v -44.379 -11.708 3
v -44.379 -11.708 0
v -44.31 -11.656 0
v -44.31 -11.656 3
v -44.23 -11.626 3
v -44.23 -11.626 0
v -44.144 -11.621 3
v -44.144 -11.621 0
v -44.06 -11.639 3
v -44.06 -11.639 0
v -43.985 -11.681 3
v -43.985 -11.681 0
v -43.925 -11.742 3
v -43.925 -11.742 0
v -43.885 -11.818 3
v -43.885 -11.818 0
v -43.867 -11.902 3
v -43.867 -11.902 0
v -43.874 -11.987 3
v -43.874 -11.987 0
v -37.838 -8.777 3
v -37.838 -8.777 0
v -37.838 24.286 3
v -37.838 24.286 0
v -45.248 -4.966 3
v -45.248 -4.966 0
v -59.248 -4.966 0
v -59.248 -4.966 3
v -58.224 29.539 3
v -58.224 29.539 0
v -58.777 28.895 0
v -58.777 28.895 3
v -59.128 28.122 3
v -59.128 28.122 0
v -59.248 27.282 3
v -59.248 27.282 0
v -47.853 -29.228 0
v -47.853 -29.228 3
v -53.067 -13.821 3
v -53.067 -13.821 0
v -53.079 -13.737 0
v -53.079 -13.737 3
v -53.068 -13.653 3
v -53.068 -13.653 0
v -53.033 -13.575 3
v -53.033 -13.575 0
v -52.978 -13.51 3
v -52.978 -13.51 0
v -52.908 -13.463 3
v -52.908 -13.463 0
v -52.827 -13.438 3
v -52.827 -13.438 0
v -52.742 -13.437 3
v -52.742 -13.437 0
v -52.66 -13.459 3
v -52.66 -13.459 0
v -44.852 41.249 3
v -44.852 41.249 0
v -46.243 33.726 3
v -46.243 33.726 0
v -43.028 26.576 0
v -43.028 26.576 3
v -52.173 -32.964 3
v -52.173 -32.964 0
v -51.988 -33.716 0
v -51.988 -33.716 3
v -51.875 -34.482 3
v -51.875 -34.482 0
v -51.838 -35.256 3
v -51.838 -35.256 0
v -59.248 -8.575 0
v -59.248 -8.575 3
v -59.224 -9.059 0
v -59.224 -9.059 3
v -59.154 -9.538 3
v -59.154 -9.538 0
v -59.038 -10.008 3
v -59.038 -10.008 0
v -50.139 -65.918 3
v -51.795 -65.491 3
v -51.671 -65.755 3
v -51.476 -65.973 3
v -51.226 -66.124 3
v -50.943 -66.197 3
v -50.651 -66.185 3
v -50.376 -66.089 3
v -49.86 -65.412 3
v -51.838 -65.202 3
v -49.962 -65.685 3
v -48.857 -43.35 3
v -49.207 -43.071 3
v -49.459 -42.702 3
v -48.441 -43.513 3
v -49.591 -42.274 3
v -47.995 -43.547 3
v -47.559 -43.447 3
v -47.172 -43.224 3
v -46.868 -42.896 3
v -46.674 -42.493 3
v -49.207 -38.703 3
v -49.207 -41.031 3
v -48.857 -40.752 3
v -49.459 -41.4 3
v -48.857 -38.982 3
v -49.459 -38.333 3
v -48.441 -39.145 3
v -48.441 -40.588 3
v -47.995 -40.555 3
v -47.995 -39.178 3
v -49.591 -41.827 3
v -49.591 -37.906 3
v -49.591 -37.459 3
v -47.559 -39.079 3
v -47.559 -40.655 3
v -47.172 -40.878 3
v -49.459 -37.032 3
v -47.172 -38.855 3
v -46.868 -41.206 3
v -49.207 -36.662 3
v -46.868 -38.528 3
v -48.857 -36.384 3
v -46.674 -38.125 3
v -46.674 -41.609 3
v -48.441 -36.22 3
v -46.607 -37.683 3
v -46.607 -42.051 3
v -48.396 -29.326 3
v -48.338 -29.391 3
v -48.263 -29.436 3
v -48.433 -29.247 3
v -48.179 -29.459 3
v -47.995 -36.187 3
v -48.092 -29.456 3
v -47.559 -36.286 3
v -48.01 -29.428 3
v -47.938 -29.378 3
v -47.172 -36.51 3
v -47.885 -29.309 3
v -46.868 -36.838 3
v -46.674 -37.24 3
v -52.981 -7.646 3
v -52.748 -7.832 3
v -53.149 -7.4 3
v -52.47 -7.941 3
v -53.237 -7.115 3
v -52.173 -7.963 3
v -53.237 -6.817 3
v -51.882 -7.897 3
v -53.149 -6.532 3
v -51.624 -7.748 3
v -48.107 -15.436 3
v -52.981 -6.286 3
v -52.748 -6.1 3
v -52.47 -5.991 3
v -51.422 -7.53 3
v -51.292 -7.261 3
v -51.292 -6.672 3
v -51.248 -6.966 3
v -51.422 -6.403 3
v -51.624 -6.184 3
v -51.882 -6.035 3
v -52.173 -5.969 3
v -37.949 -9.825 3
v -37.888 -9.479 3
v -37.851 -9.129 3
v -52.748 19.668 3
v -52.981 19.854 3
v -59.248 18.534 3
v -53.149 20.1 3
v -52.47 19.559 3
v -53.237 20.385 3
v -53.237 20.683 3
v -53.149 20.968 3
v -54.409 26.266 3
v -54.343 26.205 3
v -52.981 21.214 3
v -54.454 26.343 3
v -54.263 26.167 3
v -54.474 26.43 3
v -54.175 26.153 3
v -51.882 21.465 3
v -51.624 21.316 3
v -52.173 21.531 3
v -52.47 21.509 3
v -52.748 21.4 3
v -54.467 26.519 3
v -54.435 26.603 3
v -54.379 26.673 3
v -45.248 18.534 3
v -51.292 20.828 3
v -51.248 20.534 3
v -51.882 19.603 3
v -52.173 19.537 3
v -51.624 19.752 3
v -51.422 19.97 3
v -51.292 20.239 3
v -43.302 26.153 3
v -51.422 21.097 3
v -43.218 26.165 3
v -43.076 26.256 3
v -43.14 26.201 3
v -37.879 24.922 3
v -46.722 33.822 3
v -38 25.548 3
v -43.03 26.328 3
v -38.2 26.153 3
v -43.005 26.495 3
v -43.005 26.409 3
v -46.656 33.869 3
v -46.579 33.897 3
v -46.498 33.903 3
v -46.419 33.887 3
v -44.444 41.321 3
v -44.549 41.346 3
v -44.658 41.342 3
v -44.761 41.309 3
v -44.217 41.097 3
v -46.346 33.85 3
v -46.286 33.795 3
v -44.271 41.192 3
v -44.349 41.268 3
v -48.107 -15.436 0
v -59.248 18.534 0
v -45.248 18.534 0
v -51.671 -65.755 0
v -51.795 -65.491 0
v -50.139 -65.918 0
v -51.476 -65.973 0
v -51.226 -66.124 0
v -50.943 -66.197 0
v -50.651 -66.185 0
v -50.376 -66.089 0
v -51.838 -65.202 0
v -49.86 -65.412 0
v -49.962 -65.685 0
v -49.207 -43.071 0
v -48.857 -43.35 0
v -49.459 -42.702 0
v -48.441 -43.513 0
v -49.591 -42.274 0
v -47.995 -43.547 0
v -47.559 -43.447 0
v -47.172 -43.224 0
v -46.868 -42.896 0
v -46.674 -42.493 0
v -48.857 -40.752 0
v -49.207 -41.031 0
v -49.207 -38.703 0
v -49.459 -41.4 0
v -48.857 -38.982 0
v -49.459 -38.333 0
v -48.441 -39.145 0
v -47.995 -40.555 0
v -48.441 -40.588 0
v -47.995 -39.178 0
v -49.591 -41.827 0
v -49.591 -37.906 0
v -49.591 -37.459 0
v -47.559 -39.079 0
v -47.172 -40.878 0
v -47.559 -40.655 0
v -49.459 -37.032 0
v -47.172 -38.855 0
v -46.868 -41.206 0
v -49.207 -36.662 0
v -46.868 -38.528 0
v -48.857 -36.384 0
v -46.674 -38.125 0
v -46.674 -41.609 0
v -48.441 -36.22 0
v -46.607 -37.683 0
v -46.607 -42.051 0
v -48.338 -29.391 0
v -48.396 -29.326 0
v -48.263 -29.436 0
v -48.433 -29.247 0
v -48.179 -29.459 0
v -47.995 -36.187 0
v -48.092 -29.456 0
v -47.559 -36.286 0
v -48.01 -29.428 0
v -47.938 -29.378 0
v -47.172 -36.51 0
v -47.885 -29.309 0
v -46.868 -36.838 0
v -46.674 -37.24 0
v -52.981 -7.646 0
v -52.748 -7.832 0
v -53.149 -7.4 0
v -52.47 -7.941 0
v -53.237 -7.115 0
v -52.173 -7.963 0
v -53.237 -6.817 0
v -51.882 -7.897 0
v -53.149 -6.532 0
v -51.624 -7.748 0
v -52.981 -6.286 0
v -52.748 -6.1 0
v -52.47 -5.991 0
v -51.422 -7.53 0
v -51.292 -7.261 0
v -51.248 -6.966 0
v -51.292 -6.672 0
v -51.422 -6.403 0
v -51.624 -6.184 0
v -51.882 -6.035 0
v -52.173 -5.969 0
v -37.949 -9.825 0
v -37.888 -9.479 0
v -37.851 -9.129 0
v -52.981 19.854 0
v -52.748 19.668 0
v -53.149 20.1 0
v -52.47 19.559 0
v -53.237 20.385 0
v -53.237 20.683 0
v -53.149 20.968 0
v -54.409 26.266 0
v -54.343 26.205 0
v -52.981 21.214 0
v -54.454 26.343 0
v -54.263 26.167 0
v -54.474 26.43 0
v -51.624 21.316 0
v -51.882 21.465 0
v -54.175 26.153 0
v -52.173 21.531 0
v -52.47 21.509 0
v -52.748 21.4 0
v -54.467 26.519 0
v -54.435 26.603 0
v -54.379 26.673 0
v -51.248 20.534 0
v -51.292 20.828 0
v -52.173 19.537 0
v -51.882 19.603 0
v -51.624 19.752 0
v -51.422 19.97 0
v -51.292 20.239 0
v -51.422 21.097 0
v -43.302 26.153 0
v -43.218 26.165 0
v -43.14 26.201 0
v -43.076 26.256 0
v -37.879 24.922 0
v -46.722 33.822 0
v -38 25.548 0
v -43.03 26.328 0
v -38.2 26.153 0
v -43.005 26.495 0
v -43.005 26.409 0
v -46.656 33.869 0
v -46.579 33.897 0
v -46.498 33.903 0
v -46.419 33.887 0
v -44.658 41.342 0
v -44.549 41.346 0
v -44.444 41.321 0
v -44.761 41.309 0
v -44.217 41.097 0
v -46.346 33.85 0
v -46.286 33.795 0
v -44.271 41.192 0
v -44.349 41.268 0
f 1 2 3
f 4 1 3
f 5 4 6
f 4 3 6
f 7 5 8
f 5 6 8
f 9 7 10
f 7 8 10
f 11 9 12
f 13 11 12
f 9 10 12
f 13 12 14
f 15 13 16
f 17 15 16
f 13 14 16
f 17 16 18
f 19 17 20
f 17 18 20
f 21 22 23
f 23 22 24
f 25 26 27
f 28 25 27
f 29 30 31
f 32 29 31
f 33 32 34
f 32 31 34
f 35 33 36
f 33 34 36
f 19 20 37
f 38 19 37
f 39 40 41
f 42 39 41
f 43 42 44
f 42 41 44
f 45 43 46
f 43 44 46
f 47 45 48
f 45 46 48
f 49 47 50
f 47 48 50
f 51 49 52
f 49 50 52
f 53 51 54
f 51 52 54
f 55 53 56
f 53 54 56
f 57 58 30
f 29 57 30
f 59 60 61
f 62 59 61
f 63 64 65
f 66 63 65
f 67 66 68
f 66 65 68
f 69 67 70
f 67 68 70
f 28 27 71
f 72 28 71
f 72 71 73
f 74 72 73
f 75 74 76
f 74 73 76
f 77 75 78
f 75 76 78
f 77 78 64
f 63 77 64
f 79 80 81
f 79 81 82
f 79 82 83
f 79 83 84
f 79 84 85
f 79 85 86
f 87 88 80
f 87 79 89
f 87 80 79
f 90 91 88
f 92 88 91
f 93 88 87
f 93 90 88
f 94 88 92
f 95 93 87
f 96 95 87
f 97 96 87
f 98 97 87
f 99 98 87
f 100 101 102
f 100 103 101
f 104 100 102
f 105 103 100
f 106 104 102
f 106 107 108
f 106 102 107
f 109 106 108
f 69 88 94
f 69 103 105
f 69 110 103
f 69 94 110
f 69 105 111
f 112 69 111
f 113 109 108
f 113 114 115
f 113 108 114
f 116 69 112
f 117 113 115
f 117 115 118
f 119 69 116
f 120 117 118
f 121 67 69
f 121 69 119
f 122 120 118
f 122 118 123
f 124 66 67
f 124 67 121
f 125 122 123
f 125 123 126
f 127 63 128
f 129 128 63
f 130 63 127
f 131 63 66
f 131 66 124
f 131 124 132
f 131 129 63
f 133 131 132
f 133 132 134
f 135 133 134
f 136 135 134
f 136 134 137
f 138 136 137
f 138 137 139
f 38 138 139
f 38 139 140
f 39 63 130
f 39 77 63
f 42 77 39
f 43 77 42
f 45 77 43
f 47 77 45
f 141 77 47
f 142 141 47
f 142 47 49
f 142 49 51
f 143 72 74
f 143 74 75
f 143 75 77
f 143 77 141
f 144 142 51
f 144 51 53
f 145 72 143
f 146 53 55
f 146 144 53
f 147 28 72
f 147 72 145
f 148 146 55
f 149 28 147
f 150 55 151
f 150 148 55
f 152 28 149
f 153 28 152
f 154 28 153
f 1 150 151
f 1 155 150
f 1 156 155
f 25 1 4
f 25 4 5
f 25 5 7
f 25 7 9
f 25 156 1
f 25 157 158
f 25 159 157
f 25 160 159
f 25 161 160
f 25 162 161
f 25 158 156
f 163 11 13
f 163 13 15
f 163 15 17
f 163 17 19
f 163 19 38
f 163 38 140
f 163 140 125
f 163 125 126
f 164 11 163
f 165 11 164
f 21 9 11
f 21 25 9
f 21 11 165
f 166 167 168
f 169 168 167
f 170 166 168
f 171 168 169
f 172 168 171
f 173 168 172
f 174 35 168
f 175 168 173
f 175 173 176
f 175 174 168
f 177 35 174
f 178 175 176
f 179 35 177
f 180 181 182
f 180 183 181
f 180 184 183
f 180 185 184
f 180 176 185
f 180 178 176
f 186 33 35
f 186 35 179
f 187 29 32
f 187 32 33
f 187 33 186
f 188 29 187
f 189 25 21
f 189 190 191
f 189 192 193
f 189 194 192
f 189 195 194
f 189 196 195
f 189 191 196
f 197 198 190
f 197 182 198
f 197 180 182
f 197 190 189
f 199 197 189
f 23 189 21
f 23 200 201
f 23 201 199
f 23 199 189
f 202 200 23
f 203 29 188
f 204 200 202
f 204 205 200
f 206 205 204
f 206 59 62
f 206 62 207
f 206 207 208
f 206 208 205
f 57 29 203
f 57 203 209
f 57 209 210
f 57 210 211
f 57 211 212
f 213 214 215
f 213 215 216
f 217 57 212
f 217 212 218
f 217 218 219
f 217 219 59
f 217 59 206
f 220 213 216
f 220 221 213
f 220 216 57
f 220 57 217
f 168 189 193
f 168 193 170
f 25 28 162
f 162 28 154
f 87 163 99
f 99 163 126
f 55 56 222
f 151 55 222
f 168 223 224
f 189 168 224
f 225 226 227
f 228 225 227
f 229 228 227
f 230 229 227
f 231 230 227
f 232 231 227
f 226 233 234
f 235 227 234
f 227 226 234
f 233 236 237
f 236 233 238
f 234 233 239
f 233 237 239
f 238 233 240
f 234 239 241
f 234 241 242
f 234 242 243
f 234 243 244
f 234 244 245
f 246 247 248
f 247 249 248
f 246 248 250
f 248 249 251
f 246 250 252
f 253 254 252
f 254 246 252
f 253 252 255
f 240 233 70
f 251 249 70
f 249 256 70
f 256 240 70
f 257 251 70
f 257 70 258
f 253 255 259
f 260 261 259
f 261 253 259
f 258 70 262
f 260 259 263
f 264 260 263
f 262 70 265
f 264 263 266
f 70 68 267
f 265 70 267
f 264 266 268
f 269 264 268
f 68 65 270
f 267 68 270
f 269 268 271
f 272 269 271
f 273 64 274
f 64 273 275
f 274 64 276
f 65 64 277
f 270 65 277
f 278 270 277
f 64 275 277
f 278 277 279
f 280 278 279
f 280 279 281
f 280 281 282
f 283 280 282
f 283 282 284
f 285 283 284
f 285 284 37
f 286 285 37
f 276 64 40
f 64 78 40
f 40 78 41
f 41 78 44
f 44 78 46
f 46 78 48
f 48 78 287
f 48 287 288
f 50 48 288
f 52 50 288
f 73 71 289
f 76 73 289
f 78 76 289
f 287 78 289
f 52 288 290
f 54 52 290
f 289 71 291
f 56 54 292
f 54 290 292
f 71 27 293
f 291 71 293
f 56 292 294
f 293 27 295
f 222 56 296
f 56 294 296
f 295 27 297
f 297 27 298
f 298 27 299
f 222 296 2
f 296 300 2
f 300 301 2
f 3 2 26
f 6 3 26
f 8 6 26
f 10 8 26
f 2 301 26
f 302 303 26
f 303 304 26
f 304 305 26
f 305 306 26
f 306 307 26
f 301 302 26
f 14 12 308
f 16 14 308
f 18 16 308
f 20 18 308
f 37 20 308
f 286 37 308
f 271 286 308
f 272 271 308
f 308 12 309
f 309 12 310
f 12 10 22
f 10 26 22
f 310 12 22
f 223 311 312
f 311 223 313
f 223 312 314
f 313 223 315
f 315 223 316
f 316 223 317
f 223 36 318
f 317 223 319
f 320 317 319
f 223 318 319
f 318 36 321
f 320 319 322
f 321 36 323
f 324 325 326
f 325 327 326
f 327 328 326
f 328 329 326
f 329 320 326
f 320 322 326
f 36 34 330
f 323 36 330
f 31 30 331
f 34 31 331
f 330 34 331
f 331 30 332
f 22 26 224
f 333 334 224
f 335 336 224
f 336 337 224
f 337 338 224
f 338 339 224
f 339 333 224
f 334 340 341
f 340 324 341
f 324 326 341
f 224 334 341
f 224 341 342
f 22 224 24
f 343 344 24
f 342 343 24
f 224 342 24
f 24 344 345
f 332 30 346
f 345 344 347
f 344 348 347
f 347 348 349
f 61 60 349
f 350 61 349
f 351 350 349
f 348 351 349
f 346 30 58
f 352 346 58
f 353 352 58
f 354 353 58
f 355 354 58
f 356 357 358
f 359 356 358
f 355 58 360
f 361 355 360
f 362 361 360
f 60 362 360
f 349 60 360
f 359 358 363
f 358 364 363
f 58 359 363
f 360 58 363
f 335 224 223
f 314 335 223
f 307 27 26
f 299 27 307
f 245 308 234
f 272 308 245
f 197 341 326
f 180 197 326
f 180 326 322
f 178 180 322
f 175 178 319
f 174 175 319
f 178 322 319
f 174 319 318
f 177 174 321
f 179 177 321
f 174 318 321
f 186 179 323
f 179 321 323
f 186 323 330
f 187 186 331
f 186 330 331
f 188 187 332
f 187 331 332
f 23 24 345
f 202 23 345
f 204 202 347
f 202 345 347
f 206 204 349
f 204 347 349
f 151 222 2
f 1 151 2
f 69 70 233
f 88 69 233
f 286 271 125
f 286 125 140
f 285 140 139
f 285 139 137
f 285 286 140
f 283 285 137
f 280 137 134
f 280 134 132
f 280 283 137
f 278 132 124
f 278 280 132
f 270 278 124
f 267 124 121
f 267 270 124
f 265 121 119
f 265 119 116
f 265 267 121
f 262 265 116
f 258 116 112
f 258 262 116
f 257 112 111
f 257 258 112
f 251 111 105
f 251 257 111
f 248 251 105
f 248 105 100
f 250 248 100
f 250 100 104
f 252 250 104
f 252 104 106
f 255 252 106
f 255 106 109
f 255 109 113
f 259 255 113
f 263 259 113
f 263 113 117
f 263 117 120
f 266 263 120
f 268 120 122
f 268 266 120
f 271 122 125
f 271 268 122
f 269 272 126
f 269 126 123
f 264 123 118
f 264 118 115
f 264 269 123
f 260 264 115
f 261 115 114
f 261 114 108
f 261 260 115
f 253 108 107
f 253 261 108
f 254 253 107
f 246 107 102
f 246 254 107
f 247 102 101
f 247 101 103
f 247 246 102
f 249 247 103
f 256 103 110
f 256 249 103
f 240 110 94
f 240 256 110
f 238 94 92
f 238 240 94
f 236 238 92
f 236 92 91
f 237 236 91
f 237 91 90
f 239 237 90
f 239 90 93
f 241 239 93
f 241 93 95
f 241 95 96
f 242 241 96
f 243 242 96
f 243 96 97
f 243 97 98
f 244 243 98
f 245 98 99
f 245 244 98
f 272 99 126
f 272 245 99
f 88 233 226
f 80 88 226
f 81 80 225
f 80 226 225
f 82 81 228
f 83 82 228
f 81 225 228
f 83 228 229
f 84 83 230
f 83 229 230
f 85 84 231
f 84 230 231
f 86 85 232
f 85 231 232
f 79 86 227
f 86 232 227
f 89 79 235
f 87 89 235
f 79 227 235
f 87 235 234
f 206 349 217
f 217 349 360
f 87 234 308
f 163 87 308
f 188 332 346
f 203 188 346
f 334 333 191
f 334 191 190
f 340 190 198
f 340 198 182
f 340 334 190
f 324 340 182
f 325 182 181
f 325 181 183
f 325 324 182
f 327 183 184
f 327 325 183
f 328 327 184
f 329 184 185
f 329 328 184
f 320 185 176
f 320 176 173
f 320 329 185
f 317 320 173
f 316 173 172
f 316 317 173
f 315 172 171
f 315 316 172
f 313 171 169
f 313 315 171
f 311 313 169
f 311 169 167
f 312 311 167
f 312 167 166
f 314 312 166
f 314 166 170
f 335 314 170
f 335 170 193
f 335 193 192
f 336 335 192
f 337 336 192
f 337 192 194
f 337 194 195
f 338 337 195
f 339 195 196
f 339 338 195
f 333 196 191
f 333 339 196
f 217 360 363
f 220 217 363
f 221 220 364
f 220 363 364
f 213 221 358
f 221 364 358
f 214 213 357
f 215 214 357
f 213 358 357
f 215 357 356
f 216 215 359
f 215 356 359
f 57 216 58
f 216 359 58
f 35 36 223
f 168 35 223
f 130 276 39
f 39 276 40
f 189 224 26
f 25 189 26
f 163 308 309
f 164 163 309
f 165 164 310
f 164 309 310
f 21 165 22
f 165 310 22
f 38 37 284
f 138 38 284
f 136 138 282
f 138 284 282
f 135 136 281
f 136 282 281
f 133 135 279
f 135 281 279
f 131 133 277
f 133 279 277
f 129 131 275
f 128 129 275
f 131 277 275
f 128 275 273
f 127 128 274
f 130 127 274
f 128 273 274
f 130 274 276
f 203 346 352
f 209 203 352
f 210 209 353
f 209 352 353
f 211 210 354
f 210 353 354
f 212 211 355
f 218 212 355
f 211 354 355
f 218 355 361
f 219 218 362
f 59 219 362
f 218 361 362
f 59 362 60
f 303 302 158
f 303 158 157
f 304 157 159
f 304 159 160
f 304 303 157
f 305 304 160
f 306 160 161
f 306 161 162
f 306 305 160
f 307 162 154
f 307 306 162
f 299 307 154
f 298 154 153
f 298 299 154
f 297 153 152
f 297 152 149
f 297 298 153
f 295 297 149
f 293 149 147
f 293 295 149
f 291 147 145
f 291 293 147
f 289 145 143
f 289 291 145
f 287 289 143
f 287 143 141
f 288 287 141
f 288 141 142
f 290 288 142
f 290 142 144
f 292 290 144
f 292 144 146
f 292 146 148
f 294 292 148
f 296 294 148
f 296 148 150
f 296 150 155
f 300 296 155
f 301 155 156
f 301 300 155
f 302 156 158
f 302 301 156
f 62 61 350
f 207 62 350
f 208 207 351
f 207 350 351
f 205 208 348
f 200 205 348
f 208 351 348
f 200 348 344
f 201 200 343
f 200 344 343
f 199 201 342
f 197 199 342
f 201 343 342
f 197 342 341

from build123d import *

# Parameters (mm, degrees)
SKETCH1_R           = 1
SKETCH1_R_2         = 1.5
BOSS_EXTRUDE1_DEPTH = 3


with BuildPart() as part:
    # Sketch1 → Boss-Extrude1 (new body)
    with BuildSketch(Plane.XY):
        with BuildLine():
            Line((-59.247809755, 25.254592271), (-59.247809755, 18.533720681))
            Line((-59.247809755, 18.533720681), (-45.247809755, 18.533720681))
            Line((-45.247809755, 18.533720681), (-45.247809755, -4.966279319))
            Line((-45.247809755, -4.966279319), (-59.247809755, -4.966279319))
            Line((-59.247809755, -4.966279319), (-59.247809755, -8.575462785))
            ThreePointArc((-59.247809755, -8.575462785), (-59.195128163, -9.299369248), (-59.038193528, -10.008021094))
            Line((-59.038193528, -10.008021094), (-52.173270473, -32.963886693))
            ThreePointArc((-52.173270473, -32.963886693), (-51.922175056, -34.097729646), (-51.83788451, -35.255979988))
            Line((-51.83788451, -35.255979988), (-51.83788451, -65.202303041))
            ThreePointArc((-51.83788451, -65.202303041), (-50.943230184, -66.196738704), (-49.860079932, -65.411822033))
            Line((-49.860079932, -65.411822033), (-37.949217773, -9.824997069))
            ThreePointArc((-37.949217773, -9.824997069), (-37.866062344, -9.304130483), (-37.838240661, -8.777402109))
            Line((-37.838240661, -8.777402109), (-37.838240661, 24.285754655))
            ThreePointArc((-37.838240661, 24.285754655), (-37.929542195, 25.236900999), (-38.200112409, 26.153310895))
            Line((-38.200112409, 26.153310895), (-44.217426695, 41.09747953))
            ThreePointArc((-44.217426695, 41.09747953), (-44.495580184, 41.337138252), (-44.852002492, 41.248997433))
            Line((-44.852002492, 41.248997433), (-58.224251279, 29.538573021))
            ThreePointArc((-58.224251279, 29.538573021), (-58.979963171, 28.520742463), (-59.247809755, 27.28165501))
            Line((-59.247809755, 27.28165501), (-59.247809755, 25.254592271))
        make_face()
        with Locations((-52.247809755, 20.533720681)):
            Circle(SKETCH1_R, mode=Mode.SUBTRACT)
        with Locations((-52.247809755, -6.966279319)):
            Circle(SKETCH1_R, mode=Mode.SUBTRACT)
        with Locations((-48.107299335, -37.682543737)):
            Circle(SKETCH1_R_2, mode=Mode.SUBTRACT)
        with Locations((-48.107299335, -42.050855836)):
            Circle(SKETCH1_R_2, mode=Mode.SUBTRACT)
        with BuildLine():
            Line((-46.243433747, 33.726215246), (-43.028458535, 26.576341757))
            ThreePointArc((-43.028458535, 26.576341757), (-43.050168294, 26.290383394), (-43.302070317, 26.153310895))
            Line((-43.302070317, 26.153310895), (-54.174570897, 26.153310895))
            ThreePointArc((-54.174570897, 26.153310895), (-54.453661171, 26.343271723), (-54.379309982, 26.672586766))
            Line((-54.379309982, 26.672586766), (-46.721784613, 33.822460255))
            ThreePointArc((-46.721784613, 33.822460255), (-46.457870892, 33.897290424), (-46.243433747, 33.726215246))
        make_face(mode=Mode.SUBTRACT)
        with BuildLine():
            Line((-48.107299335, -15.436077517), (-44.378825251, -11.707603433))
            ThreePointArc((-44.378825251, -11.707603433), (-44.021262657, -11.657342723), (-43.874375858, -11.987193319))
            Line((-43.874375858, -11.987193319), (-47.853011905, -29.227949523))
            ThreePointArc((-47.853011905, -29.227949523), (-48.135577902, -29.460333147), (-48.432645874, -29.246800218))
            Line((-48.432645874, -29.246800218), (-53.066527122, -13.820853431))
            ThreePointArc((-53.066527122, -13.820853431), (-52.978484336, -13.510290691), (-52.659725089, -13.459366335))
            Line((-52.659725089, -13.459366335), (-48.107299335, -15.436077517))
        make_face(mode=Mode.SUBTRACT)
    extrude(amount=BOSS_EXTRUDE1_DEPTH)


solid = part.part
